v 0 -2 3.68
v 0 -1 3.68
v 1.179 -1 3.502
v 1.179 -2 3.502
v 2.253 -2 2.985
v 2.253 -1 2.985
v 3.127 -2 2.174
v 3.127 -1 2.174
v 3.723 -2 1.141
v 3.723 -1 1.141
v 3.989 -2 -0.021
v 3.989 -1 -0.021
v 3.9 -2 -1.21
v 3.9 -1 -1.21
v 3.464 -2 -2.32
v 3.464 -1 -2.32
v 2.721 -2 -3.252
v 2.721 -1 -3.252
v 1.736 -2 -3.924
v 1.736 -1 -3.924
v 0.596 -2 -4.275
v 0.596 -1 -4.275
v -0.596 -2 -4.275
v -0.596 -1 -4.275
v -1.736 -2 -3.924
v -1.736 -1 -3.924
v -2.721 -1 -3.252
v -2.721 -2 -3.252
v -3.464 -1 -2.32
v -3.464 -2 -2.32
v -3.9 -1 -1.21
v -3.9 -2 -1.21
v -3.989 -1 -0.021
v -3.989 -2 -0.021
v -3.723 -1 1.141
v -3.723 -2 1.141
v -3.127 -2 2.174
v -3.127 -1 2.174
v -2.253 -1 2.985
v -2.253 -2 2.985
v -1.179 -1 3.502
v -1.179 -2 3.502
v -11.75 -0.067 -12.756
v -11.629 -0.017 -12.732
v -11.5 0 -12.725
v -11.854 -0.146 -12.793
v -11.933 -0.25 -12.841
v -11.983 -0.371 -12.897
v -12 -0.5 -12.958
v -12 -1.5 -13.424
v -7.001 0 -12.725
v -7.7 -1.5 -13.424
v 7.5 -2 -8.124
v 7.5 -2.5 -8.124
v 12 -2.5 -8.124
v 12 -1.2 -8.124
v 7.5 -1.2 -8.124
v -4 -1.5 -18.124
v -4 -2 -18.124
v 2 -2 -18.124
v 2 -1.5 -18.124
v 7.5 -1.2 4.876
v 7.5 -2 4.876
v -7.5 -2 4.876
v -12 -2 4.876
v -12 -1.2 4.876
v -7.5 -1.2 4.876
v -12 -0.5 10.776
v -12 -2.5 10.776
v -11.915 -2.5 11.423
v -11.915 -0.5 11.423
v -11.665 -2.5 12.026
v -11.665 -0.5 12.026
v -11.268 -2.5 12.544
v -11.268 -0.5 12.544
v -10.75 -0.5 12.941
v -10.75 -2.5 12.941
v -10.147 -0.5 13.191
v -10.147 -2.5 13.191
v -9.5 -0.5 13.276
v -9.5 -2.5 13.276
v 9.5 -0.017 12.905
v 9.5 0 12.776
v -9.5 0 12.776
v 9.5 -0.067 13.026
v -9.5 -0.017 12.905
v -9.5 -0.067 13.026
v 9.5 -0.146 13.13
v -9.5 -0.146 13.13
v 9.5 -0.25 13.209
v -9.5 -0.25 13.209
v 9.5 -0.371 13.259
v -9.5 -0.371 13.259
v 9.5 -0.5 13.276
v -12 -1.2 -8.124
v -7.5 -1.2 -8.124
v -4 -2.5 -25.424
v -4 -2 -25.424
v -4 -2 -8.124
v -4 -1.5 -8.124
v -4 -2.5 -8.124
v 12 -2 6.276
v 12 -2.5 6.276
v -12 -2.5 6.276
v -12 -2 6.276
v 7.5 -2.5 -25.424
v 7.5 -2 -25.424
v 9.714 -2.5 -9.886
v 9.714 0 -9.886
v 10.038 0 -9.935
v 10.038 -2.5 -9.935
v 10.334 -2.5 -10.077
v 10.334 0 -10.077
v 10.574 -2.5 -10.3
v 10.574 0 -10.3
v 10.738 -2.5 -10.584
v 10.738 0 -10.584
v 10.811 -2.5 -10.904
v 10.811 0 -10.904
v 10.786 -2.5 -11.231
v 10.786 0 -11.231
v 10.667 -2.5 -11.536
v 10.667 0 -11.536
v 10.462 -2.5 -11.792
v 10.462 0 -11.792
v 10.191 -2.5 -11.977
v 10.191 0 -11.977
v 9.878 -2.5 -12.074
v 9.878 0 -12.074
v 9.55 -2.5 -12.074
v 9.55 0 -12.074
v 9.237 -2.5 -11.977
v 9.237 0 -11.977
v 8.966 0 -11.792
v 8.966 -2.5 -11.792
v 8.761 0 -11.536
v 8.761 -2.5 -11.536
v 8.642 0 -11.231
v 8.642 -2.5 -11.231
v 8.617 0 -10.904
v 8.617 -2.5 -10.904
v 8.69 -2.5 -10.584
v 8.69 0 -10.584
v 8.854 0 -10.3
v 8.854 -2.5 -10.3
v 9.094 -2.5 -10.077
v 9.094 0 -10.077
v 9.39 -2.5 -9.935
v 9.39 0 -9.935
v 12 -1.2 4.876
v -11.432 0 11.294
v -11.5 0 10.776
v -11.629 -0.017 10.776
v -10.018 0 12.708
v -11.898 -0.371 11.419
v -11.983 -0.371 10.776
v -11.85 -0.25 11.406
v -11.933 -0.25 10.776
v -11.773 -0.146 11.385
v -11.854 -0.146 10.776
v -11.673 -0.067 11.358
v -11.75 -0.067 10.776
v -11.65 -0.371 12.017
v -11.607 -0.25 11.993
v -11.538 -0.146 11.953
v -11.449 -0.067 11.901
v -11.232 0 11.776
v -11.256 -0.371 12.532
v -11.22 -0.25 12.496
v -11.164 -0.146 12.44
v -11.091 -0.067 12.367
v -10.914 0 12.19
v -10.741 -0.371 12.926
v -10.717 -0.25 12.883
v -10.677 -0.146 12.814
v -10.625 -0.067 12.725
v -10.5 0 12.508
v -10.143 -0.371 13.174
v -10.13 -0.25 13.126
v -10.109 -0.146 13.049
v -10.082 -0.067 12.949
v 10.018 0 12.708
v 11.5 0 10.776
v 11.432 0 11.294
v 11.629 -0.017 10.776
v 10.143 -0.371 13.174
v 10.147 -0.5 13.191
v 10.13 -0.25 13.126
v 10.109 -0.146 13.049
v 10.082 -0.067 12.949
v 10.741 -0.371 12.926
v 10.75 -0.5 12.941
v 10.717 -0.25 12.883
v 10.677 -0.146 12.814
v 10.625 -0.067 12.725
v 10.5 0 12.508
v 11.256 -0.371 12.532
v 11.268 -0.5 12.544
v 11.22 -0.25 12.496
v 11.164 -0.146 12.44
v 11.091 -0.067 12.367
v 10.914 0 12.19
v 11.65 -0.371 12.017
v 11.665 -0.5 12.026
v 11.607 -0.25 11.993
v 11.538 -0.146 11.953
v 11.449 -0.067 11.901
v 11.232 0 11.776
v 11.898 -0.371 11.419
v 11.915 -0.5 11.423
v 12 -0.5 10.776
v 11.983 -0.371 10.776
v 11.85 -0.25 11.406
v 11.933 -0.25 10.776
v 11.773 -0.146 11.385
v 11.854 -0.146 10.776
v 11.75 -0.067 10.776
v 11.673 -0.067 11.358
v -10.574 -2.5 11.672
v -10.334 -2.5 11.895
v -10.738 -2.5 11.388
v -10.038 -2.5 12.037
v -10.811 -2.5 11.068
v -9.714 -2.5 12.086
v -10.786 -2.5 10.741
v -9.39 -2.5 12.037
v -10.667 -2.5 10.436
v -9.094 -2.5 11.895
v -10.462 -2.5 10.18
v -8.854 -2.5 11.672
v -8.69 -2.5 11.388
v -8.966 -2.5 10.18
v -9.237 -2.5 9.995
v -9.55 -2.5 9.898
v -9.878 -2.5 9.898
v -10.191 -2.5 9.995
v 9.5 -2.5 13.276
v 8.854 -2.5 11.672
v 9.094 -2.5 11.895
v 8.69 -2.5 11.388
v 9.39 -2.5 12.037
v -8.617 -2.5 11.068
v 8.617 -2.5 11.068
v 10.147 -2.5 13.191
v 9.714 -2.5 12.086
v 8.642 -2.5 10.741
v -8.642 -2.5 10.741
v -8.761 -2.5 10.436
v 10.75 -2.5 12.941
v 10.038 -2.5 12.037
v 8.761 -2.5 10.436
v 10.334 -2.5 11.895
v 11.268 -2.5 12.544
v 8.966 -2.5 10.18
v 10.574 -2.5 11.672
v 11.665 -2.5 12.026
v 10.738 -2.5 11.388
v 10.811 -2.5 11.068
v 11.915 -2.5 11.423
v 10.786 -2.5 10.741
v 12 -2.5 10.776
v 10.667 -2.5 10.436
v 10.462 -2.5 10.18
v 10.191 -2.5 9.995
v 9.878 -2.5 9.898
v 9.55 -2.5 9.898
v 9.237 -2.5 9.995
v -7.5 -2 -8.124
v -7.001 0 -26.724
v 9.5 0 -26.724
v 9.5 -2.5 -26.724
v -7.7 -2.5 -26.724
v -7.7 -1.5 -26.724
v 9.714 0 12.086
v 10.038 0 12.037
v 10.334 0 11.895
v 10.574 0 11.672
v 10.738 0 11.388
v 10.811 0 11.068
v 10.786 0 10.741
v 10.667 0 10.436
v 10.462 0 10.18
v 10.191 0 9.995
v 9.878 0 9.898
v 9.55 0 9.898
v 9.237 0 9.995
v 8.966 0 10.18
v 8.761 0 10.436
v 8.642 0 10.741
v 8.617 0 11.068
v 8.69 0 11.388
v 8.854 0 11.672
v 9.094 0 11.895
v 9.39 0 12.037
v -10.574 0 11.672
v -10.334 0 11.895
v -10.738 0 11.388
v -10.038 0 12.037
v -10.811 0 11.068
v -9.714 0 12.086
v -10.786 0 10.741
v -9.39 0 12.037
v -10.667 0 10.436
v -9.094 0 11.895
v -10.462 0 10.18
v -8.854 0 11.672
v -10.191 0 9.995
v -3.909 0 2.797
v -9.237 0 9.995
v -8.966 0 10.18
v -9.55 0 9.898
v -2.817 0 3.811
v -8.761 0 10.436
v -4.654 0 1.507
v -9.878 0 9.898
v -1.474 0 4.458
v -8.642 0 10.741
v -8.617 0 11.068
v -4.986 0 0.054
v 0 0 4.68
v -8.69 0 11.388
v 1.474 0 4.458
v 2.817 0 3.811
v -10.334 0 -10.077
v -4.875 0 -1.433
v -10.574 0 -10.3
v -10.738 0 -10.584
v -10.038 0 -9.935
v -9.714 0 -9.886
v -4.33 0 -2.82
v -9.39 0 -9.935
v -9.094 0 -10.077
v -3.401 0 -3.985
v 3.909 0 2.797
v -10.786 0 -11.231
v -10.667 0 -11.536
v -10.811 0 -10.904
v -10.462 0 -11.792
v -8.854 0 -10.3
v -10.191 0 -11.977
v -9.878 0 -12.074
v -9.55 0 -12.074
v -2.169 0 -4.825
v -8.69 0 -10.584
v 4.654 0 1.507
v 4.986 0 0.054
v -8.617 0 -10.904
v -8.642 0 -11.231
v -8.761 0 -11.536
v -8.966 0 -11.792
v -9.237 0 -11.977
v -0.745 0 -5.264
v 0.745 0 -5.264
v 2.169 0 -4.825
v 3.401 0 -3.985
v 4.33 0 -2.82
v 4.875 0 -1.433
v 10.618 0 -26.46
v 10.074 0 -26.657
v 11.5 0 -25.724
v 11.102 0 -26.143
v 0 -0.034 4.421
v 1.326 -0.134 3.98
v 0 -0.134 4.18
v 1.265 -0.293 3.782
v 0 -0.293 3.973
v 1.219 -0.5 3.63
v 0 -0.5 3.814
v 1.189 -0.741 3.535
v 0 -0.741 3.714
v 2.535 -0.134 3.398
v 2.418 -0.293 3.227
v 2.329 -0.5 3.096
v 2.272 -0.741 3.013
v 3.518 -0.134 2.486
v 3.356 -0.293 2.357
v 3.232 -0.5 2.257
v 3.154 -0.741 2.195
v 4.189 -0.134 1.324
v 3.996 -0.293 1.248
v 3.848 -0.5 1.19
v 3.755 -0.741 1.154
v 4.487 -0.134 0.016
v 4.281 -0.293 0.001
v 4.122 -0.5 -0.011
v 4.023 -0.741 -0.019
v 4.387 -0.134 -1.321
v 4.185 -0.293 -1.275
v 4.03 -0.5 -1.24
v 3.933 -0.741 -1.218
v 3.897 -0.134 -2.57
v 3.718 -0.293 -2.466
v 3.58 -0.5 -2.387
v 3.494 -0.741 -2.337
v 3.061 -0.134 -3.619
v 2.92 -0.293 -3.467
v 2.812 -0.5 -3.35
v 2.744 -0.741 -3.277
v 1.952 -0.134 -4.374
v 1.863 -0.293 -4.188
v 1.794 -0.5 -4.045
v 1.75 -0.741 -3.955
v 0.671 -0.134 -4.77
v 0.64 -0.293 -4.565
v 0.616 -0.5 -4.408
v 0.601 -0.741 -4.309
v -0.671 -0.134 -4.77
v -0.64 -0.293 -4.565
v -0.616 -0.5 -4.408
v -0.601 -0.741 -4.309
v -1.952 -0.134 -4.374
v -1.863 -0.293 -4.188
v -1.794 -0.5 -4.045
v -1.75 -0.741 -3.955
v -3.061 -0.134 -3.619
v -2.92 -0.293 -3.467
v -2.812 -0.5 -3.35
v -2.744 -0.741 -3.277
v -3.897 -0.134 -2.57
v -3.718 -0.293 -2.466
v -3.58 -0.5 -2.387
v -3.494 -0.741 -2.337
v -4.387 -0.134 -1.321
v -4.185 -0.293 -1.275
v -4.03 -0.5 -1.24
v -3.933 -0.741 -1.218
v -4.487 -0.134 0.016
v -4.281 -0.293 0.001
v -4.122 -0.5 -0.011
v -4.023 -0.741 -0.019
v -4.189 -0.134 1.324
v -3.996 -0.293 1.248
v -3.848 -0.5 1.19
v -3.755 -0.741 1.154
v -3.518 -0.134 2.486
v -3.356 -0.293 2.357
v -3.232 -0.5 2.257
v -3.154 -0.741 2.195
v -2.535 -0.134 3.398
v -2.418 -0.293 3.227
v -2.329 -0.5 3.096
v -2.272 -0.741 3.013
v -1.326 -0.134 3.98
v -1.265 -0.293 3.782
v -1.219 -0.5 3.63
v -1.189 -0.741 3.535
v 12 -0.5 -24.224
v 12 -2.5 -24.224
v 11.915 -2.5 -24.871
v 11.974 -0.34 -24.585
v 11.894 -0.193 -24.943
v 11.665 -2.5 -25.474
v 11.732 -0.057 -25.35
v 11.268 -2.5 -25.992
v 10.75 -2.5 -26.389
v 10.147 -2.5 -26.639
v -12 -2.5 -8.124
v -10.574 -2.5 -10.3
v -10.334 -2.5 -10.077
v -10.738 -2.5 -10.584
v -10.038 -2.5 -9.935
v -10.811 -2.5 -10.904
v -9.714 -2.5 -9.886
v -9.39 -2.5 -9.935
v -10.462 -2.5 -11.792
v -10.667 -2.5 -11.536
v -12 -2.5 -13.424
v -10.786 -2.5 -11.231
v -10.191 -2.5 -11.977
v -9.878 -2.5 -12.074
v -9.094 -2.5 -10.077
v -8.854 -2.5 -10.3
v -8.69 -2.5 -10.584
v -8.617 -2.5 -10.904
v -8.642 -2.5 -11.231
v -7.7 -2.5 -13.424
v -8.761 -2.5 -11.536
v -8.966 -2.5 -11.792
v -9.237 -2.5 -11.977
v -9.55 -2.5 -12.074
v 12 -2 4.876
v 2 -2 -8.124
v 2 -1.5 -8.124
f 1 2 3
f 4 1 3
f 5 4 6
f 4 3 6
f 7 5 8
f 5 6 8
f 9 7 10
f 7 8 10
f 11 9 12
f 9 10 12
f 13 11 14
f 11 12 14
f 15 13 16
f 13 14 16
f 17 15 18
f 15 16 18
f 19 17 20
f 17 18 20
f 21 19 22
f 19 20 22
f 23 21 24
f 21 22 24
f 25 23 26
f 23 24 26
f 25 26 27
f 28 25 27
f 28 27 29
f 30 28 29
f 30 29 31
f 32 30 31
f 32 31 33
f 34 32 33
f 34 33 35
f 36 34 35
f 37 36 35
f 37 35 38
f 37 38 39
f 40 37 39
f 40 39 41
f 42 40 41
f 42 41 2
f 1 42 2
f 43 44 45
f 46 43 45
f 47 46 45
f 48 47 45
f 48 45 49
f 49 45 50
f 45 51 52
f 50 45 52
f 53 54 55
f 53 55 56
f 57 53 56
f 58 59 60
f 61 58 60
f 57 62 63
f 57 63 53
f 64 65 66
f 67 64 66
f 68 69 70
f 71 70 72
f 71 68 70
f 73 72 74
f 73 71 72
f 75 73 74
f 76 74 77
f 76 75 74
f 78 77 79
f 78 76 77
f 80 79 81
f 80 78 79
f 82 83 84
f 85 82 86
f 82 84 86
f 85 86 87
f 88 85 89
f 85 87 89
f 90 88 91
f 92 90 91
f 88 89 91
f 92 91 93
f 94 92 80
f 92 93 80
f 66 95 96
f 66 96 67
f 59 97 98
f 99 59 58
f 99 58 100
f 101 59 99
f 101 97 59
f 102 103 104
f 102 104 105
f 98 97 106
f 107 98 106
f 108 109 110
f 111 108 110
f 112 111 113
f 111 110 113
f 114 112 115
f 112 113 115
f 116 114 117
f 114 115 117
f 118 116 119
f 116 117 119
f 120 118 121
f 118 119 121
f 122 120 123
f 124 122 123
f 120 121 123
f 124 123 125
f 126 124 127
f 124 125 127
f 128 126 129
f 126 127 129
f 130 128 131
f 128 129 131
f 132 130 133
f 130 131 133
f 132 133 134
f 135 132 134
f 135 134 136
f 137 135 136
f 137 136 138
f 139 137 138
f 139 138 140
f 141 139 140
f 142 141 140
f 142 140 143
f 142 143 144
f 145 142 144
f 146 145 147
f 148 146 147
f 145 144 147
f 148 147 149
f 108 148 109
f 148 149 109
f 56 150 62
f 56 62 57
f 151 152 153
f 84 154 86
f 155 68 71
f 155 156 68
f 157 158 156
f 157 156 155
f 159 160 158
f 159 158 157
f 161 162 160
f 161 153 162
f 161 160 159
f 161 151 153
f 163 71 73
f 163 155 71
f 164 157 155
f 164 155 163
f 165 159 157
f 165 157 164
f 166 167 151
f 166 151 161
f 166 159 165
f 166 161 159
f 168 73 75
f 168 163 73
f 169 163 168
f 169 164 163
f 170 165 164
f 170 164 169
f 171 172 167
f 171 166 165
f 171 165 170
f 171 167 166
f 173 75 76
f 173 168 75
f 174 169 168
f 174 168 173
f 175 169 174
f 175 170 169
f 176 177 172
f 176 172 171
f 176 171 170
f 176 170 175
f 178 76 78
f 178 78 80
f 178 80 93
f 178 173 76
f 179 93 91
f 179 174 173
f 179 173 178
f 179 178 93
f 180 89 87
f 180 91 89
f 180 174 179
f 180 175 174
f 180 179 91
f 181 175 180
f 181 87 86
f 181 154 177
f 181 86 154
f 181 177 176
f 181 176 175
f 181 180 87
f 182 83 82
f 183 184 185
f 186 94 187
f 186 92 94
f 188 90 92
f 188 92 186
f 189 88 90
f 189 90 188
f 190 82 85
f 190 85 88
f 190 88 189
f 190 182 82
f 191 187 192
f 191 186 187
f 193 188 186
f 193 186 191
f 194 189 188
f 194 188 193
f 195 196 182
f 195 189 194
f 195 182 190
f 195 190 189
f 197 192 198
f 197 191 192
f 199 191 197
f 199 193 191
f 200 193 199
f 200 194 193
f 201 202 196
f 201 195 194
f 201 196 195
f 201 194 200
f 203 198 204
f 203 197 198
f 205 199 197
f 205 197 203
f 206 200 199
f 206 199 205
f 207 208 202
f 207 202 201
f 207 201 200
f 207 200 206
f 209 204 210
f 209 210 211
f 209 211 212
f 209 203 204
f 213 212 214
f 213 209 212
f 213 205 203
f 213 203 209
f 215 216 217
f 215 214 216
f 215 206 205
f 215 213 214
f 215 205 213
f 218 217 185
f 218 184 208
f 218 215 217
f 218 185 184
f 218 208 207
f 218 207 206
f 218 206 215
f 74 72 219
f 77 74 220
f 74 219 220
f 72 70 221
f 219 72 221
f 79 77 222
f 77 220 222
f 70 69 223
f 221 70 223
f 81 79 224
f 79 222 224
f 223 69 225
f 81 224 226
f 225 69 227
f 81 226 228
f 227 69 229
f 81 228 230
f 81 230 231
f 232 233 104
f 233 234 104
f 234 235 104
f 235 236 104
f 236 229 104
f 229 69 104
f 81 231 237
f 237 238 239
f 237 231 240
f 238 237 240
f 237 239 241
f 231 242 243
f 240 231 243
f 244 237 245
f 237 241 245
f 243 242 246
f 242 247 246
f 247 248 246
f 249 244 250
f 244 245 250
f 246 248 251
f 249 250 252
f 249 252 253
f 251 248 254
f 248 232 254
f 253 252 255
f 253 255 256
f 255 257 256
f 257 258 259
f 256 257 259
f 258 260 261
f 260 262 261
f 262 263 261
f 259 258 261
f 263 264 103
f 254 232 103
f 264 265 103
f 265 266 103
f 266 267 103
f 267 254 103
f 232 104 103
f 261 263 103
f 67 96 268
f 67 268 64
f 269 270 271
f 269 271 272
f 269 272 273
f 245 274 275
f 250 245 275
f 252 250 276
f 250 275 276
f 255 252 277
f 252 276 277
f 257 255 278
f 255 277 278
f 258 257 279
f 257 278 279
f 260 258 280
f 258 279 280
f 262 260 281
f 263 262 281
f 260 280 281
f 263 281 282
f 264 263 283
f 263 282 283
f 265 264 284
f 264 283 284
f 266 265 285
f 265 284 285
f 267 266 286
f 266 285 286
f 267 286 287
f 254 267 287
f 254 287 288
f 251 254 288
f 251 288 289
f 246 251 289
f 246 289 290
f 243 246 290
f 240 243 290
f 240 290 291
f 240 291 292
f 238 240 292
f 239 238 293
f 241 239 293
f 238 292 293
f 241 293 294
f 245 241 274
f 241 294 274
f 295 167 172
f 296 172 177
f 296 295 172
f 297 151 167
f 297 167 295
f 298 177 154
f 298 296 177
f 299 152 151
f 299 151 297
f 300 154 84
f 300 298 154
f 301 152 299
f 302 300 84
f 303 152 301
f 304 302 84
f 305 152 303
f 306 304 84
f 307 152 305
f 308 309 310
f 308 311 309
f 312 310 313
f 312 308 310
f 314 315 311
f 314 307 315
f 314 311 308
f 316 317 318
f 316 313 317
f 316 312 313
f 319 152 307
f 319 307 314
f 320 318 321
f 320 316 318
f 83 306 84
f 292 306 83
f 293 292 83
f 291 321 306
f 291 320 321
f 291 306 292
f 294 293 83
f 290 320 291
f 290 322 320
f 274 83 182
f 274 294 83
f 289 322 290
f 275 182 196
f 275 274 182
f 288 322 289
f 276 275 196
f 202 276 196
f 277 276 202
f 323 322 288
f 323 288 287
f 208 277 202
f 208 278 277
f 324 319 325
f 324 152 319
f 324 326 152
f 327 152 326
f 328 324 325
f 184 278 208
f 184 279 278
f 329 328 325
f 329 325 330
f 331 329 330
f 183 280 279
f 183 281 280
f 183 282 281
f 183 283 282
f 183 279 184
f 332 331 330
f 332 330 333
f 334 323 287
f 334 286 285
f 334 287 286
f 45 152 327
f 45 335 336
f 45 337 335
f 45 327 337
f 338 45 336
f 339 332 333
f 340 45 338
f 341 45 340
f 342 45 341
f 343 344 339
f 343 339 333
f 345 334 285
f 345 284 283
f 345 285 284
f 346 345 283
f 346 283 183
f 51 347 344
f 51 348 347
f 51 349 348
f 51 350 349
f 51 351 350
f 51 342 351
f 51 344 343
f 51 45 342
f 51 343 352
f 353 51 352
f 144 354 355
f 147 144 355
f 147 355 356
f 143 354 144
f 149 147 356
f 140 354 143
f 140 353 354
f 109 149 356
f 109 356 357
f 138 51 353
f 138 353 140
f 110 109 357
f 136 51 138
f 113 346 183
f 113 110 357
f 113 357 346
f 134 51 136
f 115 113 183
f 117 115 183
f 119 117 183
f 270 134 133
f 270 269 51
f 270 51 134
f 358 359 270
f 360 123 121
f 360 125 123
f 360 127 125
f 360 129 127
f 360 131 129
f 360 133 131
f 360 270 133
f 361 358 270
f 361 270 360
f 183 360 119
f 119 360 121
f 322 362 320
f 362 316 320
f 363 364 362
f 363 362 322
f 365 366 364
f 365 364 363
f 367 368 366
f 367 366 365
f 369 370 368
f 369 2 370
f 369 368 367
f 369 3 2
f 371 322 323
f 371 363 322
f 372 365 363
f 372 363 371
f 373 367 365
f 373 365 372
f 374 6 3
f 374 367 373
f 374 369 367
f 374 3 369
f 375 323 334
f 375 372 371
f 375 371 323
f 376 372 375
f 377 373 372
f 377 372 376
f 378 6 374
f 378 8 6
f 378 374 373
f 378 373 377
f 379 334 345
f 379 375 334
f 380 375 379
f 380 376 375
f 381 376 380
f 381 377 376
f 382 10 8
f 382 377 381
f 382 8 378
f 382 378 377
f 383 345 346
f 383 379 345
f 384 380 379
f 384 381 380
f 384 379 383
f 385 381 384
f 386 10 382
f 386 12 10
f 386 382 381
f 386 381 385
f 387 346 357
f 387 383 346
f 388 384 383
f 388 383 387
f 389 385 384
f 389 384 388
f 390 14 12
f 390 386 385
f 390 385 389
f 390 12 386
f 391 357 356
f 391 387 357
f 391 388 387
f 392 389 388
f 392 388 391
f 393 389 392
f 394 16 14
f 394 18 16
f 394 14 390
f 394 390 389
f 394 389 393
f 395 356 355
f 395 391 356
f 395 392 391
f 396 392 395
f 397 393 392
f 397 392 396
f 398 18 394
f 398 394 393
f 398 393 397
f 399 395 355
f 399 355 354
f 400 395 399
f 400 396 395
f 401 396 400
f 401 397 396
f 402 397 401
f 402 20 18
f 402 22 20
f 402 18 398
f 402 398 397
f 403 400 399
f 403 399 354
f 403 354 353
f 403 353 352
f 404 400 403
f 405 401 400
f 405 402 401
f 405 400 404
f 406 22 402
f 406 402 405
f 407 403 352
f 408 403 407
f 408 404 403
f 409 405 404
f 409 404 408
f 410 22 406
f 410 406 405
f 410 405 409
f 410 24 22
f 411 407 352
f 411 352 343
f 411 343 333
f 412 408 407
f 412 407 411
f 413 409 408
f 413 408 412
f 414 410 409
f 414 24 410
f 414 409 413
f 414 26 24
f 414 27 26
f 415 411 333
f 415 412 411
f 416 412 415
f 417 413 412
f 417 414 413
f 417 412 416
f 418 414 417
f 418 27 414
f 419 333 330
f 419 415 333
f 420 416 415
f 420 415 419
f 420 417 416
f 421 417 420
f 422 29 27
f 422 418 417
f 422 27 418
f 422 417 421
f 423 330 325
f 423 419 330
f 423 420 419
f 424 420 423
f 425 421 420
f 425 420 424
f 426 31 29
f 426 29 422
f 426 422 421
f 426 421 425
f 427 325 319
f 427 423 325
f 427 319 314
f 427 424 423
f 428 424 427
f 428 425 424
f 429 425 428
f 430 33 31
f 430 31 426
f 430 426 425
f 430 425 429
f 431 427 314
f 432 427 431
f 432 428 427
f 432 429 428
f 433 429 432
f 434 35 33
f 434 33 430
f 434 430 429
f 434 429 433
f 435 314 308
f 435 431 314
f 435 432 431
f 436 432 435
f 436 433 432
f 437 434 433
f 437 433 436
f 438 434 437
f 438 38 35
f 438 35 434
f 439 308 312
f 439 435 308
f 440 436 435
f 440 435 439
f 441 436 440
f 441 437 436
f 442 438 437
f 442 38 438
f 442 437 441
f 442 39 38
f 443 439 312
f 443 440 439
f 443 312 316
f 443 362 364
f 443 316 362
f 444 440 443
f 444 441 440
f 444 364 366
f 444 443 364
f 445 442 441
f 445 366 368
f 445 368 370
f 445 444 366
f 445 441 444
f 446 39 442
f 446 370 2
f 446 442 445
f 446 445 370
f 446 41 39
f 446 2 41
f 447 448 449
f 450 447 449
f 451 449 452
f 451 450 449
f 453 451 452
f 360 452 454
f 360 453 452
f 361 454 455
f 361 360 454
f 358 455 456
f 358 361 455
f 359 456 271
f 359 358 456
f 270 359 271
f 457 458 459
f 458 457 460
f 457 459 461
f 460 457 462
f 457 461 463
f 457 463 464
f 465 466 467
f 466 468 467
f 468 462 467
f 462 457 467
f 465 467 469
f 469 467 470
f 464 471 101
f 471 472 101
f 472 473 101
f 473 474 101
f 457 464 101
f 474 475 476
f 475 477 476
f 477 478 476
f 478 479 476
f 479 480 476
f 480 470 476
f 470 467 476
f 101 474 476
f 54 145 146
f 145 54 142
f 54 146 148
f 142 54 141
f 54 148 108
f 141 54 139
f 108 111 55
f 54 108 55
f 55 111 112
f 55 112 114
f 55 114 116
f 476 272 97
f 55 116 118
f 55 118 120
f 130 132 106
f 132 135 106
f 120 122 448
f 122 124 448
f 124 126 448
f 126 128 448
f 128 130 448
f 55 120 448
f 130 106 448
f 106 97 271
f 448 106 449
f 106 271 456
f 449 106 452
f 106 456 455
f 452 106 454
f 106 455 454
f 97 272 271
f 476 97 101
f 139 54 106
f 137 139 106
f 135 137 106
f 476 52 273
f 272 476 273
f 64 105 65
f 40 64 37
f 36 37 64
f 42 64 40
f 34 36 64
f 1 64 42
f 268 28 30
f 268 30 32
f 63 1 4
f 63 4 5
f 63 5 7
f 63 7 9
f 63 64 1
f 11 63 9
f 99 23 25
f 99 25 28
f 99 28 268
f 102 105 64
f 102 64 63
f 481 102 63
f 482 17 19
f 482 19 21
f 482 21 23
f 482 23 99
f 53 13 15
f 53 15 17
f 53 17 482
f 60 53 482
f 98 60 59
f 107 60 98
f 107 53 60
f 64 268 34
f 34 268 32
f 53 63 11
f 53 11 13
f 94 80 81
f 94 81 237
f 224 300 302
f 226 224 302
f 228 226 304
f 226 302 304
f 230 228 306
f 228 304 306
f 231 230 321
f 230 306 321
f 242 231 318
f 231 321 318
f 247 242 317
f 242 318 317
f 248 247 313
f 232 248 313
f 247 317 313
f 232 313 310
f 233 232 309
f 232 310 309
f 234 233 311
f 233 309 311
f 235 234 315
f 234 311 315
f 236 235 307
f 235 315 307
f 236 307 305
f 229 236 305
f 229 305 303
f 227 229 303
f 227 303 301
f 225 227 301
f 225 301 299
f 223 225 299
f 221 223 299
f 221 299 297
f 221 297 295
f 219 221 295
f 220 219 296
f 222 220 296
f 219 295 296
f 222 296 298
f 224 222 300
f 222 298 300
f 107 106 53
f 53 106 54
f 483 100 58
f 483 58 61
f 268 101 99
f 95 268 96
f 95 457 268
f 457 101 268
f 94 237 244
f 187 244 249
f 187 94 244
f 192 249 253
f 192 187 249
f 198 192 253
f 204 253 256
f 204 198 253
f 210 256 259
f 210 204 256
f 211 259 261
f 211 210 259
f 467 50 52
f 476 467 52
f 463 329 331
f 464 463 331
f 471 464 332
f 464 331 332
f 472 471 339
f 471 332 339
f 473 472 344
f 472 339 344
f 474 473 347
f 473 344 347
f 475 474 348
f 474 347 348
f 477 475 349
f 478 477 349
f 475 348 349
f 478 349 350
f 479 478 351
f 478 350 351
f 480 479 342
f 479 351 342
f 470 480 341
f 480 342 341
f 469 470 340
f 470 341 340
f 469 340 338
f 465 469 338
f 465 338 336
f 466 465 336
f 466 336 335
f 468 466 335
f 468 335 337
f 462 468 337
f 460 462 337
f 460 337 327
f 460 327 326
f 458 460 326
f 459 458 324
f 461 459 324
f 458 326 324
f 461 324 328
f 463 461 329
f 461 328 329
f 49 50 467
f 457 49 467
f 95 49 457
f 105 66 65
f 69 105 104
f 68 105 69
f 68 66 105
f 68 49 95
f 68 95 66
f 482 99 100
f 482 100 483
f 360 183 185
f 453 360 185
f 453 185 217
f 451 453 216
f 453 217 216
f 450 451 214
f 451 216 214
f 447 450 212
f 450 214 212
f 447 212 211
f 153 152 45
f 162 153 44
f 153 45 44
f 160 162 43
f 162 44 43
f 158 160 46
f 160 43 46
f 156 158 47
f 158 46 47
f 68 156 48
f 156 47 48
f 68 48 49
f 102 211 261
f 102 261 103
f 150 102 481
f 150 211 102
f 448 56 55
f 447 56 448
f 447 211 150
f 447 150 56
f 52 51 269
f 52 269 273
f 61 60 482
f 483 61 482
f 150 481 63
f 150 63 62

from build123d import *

# Parameters (mm, degrees)
SKETCH_1_R           = 1.1
SKETCH_1_R_2         = 4
EXTRUDE_1_DEPTH      = 2.5
SKETCH_2_W           = 14.4
SKETCH_2_H           = 0.5
CUT_EXTRUDE_1_DEPTH  = 37.005863078
SKETCH_3_W           = 13
SKETCH_3_H           = 1.3
CUT_EXTRUDE_2_DEPTH  = 4.5
SKETCH_4_W           = 13
SKETCH_4_H           = 1.3
CUT_EXTRUDE_3_DEPTH  = 4.5
SKETCH_5_W           = 11.5
SKETCH_5_H           = 17.3
CUT_EXTRUDE_11_DEPTH = 0.5
SKETCH_6_W           = 6
SKETCH_6_H           = 10
CUT_EXTRUDE_12_DEPTH = 0.5
FILLET_1_R           = 0.5
FILLET_2_R           = 1
SKETCH_7_W           = 4.3
SKETCH_7_H           = 13.3
CUT_EXTRUDE_13_DEPTH = 30.401057536
CHAMFER_1_SIZE       = 0.699461487
CHAMFER_1_SIZE_2     = 1.5


with BuildPart() as part:
    # 草图1 → 凸台-拉伸1 (new body)
    with BuildSketch(Plane(origin=(0, 0, 0), x_dir=(1, 0, 0), z_dir=(0, 1, 0))):
        with BuildLine():
            Line((-12, 24.224), (-12, -10.776))
            ThreePointArc((-12, -10.776), (-11.267766953, -12.543766953), (-9.5, -13.276))
            Line((-9.5, -13.276), (9.5, -13.276))
            ThreePointArc((9.5, -13.276), (11.267766953, -12.543766953), (12, -10.776))
            Line((12, -10.776), (12, 24.224))
            ThreePointArc((12, 24.224), (11.267766953, 25.991766953), (9.5, 26.724))
            Line((9.5, 26.724), (-9.5, 26.724))
            ThreePointArc((-9.5, 26.724), (-11.267766953, 25.991766953), (-12, 24.224))
        make_face()
        with Locations(Location((-9.714, -10.986, 0), (0, 0, 270))):
            Circle(SKETCH_1_R, mode=Mode.SUBTRACT)
        with Locations(Location((0, 0.32, 0), (0, 0, 270))):
            Circle(SKETCH_1_R_2, mode=Mode.SUBTRACT)
        with Locations(Location((9.714, -10.986, 0), (0, 0, 270))):
            Circle(SKETCH_1_R, mode=Mode.SUBTRACT)
        with Locations(Location((9.714, 10.986, 0), (0, 0, 270))):
            Circle(SKETCH_1_R, mode=Mode.SUBTRACT)
        with Locations(Location((-9.714, 10.986, 0), (0, 0, 270))):
            Circle(SKETCH_1_R, mode=Mode.SUBTRACT)
    extrude(amount=-EXTRUDE_1_DEPTH)

    # 草图2 → 切除-拉伸1 (cut, through all)
    with BuildSketch(Plane(origin=(12, 0, 0), x_dir=(0, 0, -1), z_dir=(1, 0, 0))):
        with Locations((0.924, -2.25)):
            Rectangle(SKETCH_2_W, SKETCH_2_H)
    extrude(amount=-CUT_EXTRUDE_1_DEPTH, mode=Mode.SUBTRACT)

    # 草图3 → 切除-拉伸2 (cut)
    with BuildSketch(Plane(origin=(12, 0, 0), x_dir=(0, 0, -1), z_dir=(1, 0, 0))):
        with Locations((1.624, -1.85)):
            Rectangle(SKETCH_3_W, SKETCH_3_H)
    extrude(amount=-CUT_EXTRUDE_2_DEPTH, mode=Mode.SUBTRACT)

    # 草图4 → 切除-拉伸3 (cut)
    with BuildSketch(Plane.ZY.offset(12)):
        with Locations((-1.624, -1.85)):
            Rectangle(SKETCH_4_W, SKETCH_4_H)
    extrude(amount=-CUT_EXTRUDE_3_DEPTH, mode=Mode.SUBTRACT)

    # 草图5 → 切除-拉伸11 (cut)
    with BuildSketch(Plane.XZ.offset(2.5)):
        with Locations((1.75, -16.774)):
            Rectangle(SKETCH_5_W, SKETCH_5_H)
    extrude(amount=-CUT_EXTRUDE_11_DEPTH, mode=Mode.SUBTRACT)

    # 草图6 → 切除-拉伸12 (cut)
    with BuildSketch(Plane.XZ.offset(2)):
        with Locations((-1, -13.124)):
            Rectangle(SKETCH_6_W, SKETCH_6_H)
    extrude(amount=-CUT_EXTRUDE_12_DEPTH, mode=Mode.SUBTRACT)

    # 圆角1
    # the kernel refuses this fillet: 0.5 mm, written as the material it takes off along each edge
    with BuildSketch(Plane(origin=(-9.5, 0, 13.276), x_dir=(0, 0, -1), z_dir=(1, 0, 0))) as fillet_1_piece_1:
        with BuildLine():
            CenterArc((FILLET_1_R, -FILLET_1_R), FILLET_1_R, 90, 90)
            Line((0, -FILLET_1_R), (-FILLET_1_R * 0.02, -FILLET_1_R))
            Line((-FILLET_1_R * 0.02, -FILLET_1_R), (-FILLET_1_R * 0.02, FILLET_1_R * 0.02))
            Line((-FILLET_1_R * 0.02, FILLET_1_R * 0.02), (FILLET_1_R, FILLET_1_R * 0.02))
            Line((FILLET_1_R, FILLET_1_R * 0.02), (FILLET_1_R, 0))
        make_face()
    extrude(amount=19, mode=Mode.SUBTRACT)
    with BuildSketch(Plane(origin=(-9.5, 0, 10.776), x_dir=(-1, 0, 0), z_dir=(0, 0, -1))) as fillet_1_piece_2:
        with BuildLine():
            CenterArc((2.5 - FILLET_1_R, -FILLET_1_R), FILLET_1_R, 0, 90)
            Line((2.5, -FILLET_1_R), (2.5 + FILLET_1_R * 0.02, -FILLET_1_R))
            Line((2.5 + FILLET_1_R * 0.02, -FILLET_1_R), (2.5 + FILLET_1_R * 0.02, FILLET_1_R * 0.02))
            Line((2.5 + FILLET_1_R * 0.02, FILLET_1_R * 0.02), (2.5 - FILLET_1_R, FILLET_1_R * 0.02))
            Line((2.5 - FILLET_1_R, FILLET_1_R * 0.02), (2.5 - FILLET_1_R, 0))
        make_face()
    revolve(axis=Axis((-9.5, 0, 10.776), (0, 1, 0)), revolution_arc=90, mode=Mode.SUBTRACT)
    with BuildSketch(Plane(origin=(-12, 0, -27.224), x_dir=(0, -1, 0), z_dir=(0, 0, 1))) as fillet_1_piece_3:
        with BuildLine():
            CenterArc((FILLET_1_R, FILLET_1_R), FILLET_1_R, 180, 90)
            Line((0, FILLET_1_R), (-FILLET_1_R * 0.02, FILLET_1_R))
            Line((-FILLET_1_R * 0.02, FILLET_1_R), (-FILLET_1_R * 0.02, -FILLET_1_R * 0.02))
            Line((-FILLET_1_R * 0.02, -FILLET_1_R * 0.02), (FILLET_1_R, -FILLET_1_R * 0.02))
            Line((FILLET_1_R, -FILLET_1_R * 0.02), (FILLET_1_R, 0))
        make_face()
    extrude(amount=38, mode=Mode.SUBTRACT)
    with BuildSketch(Plane(origin=(12, 0, 10.776), x_dir=(-1, 0, 0), z_dir=(0, 0, -1))) as fillet_1_piece_4:
        with BuildLine():
            CenterArc((FILLET_1_R, -FILLET_1_R), FILLET_1_R, 90, 90)
            Line((0, -FILLET_1_R), (-FILLET_1_R * 0.02, -FILLET_1_R))
            Line((-FILLET_1_R * 0.02, -FILLET_1_R), (-FILLET_1_R * 0.02, FILLET_1_R * 0.02))
            Line((-FILLET_1_R * 0.02, FILLET_1_R * 0.02), (FILLET_1_R, FILLET_1_R * 0.02))
            Line((FILLET_1_R, FILLET_1_R * 0.02), (FILLET_1_R, 0))
        make_face()
    extrude(amount=38, mode=Mode.SUBTRACT)
    with BuildSketch(Plane(origin=(9.5, 0, 10.776), x_dir=(0, 0, 1), z_dir=(-1, 0, 0))) as fillet_1_piece_5:
        with BuildLine():
            CenterArc((2.5 - FILLET_1_R, -FILLET_1_R), FILLET_1_R, 0, 90)
            Line((2.5, -FILLET_1_R), (2.5 + FILLET_1_R * 0.02, -FILLET_1_R))
            Line((2.5 + FILLET_1_R * 0.02, -FILLET_1_R), (2.5 + FILLET_1_R * 0.02, FILLET_1_R * 0.02))
            Line((2.5 + FILLET_1_R * 0.02, FILLET_1_R * 0.02), (2.5 - FILLET_1_R, FILLET_1_R * 0.02))
            Line((2.5 - FILLET_1_R, FILLET_1_R * 0.02), (2.5 - FILLET_1_R, 0))
        make_face()
    revolve(axis=Axis((9.5, 0, 10.776), (0, 1, 0)), revolution_arc=90, mode=Mode.SUBTRACT)

    # 圆角2
    fillet_2_edges = [part.edges().sort_by_distance(p)[0] for p in [
        (0, 0, -4.32),
    ]]
    fillet(fillet_2_edges, radius=FILLET_2_R)

    # 草图7 → 切除-拉伸13 (cut, through all)
    with BuildSketch(Plane(origin=(0, 0, 0), x_dir=(1, 0, 0), z_dir=(0, 1, 0))):
        with Locations((-9.85, 20.074)):
            Rectangle(SKETCH_7_W, SKETCH_7_H)
    extrude(amount=-CUT_EXTRUDE_13_DEPTH, mode=Mode.SUBTRACT)

    # 倒角1
    # the kernel refuses this chamfer: 1.5, 0.699461487 mm, written as the material it takes off along each edge
    with BuildSketch(Plane(origin=(-7.7, 0, -13.424), x_dir=(0, 0.07481330637059964, 0.9971975577536774), z_dir=(-1, 0, 0))) as chamfer_1_piece_1:
        Polygon((CHAMFER_1_SIZE * 0.997197558085, -CHAMFER_1_SIZE * 0.0748133063955), (-CHAMFER_1_SIZE_2 * 0.0748133063706, -CHAMFER_1_SIZE_2 * 0.997197557754), (0, 0), align=None)
    extrude(amount=7.686463207, mode=Mode.SUBTRACT)
    with BuildSketch(Plane(origin=(-7.7, 0, -30.610463207), x_dir=(0.9971975577536775, 0.07481330637059957, 0), z_dir=(0, 0, 1))) as chamfer_1_piece_2:
        Polygon((CHAMFER_1_SIZE * 0.997197558085, -CHAMFER_1_SIZE * 0.0748133063955), (-CHAMFER_1_SIZE_2 * 0.0748133063706, -CHAMFER_1_SIZE_2 * 0.997197557754), (0, 0), align=None)
    extrude(amount=17.186463207, mode=Mode.SUBTRACT)
    with BuildSketch(Plane(origin=(-3.813536793, 0, -13.424), x_dir=(0, 0.07481330637059964, 0.9971975577536774), z_dir=(-1, 0, 0))) as chamfer_1_piece_3a_section:
        Polygon((CHAMFER_1_SIZE * 0.997197558085, -CHAMFER_1_SIZE * 0.0748133063955), (-CHAMFER_1_SIZE_2 * 0.0748133063706, -CHAMFER_1_SIZE_2 * 0.997197557754), (0, 0), align=None)
    chamfer_1_piece_3a = extrude(amount=11.572926414, mode=Mode.PRIVATE)
    chamfer_1_piece_3a = split(chamfer_1_piece_3a, bisect_by=Plane(origin=(-7.7, -0.507353362, -13.203429624), z_dir=(1, 0, 0)), keep=Keep.TOP, mode=Mode.PRIVATE)
    with BuildSketch(Plane(origin=(-7.7, 0, -30.610463207), x_dir=(0.9971975577536775, 0.07481330637059957, 0), z_dir=(0, 0, 1))) as chamfer_1_piece_3b_section:
        Polygon((CHAMFER_1_SIZE * 0.997197558085, -CHAMFER_1_SIZE * 0.0748133063955), (-CHAMFER_1_SIZE_2 * 0.0748133063706, -CHAMFER_1_SIZE_2 * 0.997197557754), (0, 0), align=None)
    chamfer_1_piece_3b = extrude(amount=21.072926414, mode=Mode.PRIVATE)
    chamfer_1_piece_3b = split(chamfer_1_piece_3b, bisect_by=Plane(origin=(-7.479429624, -0.507353362, -13.424), z_dir=(0, 0, 1)), keep=Keep.TOP, mode=Mode.PRIVATE)
    chamfer_1_piece_3 = chamfer_1_piece_3a & chamfer_1_piece_3b
    add(chamfer_1_piece_3, mode=Mode.SUBTRACT)


solid = part.part
